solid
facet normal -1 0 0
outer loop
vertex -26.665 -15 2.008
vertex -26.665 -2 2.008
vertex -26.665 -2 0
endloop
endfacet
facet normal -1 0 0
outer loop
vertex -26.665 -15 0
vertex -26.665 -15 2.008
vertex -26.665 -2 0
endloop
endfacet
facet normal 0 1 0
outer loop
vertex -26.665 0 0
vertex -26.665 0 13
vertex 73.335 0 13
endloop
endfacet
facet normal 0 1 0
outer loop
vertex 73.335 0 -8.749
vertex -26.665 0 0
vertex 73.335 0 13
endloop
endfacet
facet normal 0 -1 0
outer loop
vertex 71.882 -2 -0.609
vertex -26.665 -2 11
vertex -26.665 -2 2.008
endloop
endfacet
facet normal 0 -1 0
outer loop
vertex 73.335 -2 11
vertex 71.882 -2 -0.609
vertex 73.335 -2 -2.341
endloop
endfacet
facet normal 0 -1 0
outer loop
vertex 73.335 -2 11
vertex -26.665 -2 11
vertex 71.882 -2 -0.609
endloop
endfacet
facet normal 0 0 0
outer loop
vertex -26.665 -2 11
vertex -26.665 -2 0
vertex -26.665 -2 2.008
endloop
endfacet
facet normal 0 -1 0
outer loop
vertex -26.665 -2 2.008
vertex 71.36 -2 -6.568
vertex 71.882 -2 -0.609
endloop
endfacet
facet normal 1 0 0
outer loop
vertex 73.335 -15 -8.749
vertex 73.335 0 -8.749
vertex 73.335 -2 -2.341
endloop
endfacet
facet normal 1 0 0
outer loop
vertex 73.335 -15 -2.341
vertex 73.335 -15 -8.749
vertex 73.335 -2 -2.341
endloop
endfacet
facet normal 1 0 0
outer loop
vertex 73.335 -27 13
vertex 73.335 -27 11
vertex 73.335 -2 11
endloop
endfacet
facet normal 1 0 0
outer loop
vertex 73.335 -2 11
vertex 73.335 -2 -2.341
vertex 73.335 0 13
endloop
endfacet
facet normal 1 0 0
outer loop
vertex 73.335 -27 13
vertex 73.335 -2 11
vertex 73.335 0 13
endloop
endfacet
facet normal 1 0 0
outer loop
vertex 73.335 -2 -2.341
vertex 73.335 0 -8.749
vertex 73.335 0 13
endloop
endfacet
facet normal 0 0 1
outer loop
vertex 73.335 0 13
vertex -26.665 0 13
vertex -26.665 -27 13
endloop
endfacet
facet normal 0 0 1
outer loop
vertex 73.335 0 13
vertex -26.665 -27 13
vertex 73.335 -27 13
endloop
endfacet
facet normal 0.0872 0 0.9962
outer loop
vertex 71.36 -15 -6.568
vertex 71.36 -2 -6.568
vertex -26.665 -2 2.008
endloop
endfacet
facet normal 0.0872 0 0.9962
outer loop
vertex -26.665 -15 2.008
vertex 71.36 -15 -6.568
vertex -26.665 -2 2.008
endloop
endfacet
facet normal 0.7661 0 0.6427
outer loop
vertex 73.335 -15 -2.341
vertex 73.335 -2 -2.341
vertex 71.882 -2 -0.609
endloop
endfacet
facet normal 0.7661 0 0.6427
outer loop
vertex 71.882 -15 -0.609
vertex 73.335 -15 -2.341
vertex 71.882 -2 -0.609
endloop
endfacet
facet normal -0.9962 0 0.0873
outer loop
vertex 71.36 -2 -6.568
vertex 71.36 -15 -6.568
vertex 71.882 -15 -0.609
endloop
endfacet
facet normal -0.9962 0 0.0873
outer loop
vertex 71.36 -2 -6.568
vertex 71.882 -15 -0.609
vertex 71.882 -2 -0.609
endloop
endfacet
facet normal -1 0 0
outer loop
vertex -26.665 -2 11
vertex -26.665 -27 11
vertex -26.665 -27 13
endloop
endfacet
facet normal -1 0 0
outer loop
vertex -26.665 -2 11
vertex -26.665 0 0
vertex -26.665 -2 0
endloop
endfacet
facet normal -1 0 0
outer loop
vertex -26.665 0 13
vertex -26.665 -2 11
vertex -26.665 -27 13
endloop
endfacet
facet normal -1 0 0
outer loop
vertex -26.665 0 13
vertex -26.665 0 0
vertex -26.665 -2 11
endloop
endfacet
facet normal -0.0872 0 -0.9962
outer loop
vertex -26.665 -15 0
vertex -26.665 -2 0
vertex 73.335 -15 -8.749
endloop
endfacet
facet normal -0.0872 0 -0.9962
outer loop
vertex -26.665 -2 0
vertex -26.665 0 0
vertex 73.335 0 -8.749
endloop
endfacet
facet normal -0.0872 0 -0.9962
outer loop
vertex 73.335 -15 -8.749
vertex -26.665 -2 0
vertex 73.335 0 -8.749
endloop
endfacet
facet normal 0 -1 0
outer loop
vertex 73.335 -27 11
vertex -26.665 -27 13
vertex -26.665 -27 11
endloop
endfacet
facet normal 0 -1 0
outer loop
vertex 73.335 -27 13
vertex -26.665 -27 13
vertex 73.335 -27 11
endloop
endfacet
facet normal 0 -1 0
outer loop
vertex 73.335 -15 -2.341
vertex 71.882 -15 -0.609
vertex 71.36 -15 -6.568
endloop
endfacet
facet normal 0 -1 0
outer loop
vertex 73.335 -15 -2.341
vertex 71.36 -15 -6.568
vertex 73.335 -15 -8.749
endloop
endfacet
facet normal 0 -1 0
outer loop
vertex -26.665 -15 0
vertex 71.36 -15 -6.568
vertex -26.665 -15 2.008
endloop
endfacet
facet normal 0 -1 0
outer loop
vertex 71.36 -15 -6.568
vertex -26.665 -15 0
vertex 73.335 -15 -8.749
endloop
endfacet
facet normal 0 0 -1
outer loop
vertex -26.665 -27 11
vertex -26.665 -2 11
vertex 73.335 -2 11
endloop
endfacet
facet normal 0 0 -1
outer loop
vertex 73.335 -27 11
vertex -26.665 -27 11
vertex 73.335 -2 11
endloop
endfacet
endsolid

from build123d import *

# Parameters (mm, degrees)
F1_DEPTH    = 2
F3_DEPTH    = 13
F2_W        = 100
F2_H        = 2
F4_DEPTH    = 25
F5_W        = 1.9823738266
F5_H        = 13
F6_DEPTH    = 6
F7_T1_DEPTH = 18.1433659759
F9_DEPTH    = 25


# Not quite as in the source:
# - a fillet or chamfer that OpenCascade refuses, or shapes differently, is made with other operations: its cross-section is extruded or revolved along the edge and cut away or added


with BuildPart() as f1:
    # F0 (on Front) → F1 (new body)
    with BuildSketch(Plane.XZ):
        Polygon((-26.6649637938, 13), (-26.6649637938, 0), (73.3350362062, -8.7488663526), (73.3350362062, 13), align=None)
    extrude(amount=F1_DEPTH)

    # F2 (on face) → F3 (join)
    with BuildSketch(Plane.XZ.offset(2)):
        Polygon((73.3350362062, -6.7412266775), (-26.6649136147, 2.007635285), (-26.6649637938, 0), (73.3350362062, -8.7488663526), align=None)
    extrude(amount=F3_DEPTH)

    # F2 (on face) → F4 (join)
    with BuildSketch(Plane.XZ.offset(2)):
        with Locations((23.3350362062, 12)):
            Rectangle(F2_W, F2_H)
    extrude(amount=F4_DEPTH)

    # F5 (on face) → F6 (join)
    with BuildSketch(Plane(origin=(-0.0282388724, 0, -0.322771789), x_dir=(0.9961946981, 0, -0.0871557427), z_dir=(0.0871557427, 0, 0.9961946981))):
        with Locations((72.6523239577, -8.5)):
            Rectangle(F5_W, F5_H)
    extrude(amount=F6_DEPTH)

    # F7: chamfer of 2 on 1 edges, made by hand

    # F7_s2 → F7_t1 (cut)
    with BuildSketch(Plane.XZ.offset(2)):
        Polygon((73.6836591771, -2.7564478851), (71.8655812665, -0.5897470035), (73.8579706626, -0.764058489), align=None)
    extrude(amount=F7_T1_DEPTH, mode=Mode.SUBTRACT)

    # F8 (on face) → F9 (cut)
    with BuildSketch(Plane(origin=(0, -2, 0), x_dir=(-1, 0, 0), z_dir=(0, 1, 0))):
        Polygon((-73.6836591771, -2.7564478851), (-73.3350362062, -6.7412266775), (-73.3350362062, -2.340975207), align=None)
    extrude(amount=-F9_DEPTH, mode=Mode.SUBTRACT)


solid = f1.part
